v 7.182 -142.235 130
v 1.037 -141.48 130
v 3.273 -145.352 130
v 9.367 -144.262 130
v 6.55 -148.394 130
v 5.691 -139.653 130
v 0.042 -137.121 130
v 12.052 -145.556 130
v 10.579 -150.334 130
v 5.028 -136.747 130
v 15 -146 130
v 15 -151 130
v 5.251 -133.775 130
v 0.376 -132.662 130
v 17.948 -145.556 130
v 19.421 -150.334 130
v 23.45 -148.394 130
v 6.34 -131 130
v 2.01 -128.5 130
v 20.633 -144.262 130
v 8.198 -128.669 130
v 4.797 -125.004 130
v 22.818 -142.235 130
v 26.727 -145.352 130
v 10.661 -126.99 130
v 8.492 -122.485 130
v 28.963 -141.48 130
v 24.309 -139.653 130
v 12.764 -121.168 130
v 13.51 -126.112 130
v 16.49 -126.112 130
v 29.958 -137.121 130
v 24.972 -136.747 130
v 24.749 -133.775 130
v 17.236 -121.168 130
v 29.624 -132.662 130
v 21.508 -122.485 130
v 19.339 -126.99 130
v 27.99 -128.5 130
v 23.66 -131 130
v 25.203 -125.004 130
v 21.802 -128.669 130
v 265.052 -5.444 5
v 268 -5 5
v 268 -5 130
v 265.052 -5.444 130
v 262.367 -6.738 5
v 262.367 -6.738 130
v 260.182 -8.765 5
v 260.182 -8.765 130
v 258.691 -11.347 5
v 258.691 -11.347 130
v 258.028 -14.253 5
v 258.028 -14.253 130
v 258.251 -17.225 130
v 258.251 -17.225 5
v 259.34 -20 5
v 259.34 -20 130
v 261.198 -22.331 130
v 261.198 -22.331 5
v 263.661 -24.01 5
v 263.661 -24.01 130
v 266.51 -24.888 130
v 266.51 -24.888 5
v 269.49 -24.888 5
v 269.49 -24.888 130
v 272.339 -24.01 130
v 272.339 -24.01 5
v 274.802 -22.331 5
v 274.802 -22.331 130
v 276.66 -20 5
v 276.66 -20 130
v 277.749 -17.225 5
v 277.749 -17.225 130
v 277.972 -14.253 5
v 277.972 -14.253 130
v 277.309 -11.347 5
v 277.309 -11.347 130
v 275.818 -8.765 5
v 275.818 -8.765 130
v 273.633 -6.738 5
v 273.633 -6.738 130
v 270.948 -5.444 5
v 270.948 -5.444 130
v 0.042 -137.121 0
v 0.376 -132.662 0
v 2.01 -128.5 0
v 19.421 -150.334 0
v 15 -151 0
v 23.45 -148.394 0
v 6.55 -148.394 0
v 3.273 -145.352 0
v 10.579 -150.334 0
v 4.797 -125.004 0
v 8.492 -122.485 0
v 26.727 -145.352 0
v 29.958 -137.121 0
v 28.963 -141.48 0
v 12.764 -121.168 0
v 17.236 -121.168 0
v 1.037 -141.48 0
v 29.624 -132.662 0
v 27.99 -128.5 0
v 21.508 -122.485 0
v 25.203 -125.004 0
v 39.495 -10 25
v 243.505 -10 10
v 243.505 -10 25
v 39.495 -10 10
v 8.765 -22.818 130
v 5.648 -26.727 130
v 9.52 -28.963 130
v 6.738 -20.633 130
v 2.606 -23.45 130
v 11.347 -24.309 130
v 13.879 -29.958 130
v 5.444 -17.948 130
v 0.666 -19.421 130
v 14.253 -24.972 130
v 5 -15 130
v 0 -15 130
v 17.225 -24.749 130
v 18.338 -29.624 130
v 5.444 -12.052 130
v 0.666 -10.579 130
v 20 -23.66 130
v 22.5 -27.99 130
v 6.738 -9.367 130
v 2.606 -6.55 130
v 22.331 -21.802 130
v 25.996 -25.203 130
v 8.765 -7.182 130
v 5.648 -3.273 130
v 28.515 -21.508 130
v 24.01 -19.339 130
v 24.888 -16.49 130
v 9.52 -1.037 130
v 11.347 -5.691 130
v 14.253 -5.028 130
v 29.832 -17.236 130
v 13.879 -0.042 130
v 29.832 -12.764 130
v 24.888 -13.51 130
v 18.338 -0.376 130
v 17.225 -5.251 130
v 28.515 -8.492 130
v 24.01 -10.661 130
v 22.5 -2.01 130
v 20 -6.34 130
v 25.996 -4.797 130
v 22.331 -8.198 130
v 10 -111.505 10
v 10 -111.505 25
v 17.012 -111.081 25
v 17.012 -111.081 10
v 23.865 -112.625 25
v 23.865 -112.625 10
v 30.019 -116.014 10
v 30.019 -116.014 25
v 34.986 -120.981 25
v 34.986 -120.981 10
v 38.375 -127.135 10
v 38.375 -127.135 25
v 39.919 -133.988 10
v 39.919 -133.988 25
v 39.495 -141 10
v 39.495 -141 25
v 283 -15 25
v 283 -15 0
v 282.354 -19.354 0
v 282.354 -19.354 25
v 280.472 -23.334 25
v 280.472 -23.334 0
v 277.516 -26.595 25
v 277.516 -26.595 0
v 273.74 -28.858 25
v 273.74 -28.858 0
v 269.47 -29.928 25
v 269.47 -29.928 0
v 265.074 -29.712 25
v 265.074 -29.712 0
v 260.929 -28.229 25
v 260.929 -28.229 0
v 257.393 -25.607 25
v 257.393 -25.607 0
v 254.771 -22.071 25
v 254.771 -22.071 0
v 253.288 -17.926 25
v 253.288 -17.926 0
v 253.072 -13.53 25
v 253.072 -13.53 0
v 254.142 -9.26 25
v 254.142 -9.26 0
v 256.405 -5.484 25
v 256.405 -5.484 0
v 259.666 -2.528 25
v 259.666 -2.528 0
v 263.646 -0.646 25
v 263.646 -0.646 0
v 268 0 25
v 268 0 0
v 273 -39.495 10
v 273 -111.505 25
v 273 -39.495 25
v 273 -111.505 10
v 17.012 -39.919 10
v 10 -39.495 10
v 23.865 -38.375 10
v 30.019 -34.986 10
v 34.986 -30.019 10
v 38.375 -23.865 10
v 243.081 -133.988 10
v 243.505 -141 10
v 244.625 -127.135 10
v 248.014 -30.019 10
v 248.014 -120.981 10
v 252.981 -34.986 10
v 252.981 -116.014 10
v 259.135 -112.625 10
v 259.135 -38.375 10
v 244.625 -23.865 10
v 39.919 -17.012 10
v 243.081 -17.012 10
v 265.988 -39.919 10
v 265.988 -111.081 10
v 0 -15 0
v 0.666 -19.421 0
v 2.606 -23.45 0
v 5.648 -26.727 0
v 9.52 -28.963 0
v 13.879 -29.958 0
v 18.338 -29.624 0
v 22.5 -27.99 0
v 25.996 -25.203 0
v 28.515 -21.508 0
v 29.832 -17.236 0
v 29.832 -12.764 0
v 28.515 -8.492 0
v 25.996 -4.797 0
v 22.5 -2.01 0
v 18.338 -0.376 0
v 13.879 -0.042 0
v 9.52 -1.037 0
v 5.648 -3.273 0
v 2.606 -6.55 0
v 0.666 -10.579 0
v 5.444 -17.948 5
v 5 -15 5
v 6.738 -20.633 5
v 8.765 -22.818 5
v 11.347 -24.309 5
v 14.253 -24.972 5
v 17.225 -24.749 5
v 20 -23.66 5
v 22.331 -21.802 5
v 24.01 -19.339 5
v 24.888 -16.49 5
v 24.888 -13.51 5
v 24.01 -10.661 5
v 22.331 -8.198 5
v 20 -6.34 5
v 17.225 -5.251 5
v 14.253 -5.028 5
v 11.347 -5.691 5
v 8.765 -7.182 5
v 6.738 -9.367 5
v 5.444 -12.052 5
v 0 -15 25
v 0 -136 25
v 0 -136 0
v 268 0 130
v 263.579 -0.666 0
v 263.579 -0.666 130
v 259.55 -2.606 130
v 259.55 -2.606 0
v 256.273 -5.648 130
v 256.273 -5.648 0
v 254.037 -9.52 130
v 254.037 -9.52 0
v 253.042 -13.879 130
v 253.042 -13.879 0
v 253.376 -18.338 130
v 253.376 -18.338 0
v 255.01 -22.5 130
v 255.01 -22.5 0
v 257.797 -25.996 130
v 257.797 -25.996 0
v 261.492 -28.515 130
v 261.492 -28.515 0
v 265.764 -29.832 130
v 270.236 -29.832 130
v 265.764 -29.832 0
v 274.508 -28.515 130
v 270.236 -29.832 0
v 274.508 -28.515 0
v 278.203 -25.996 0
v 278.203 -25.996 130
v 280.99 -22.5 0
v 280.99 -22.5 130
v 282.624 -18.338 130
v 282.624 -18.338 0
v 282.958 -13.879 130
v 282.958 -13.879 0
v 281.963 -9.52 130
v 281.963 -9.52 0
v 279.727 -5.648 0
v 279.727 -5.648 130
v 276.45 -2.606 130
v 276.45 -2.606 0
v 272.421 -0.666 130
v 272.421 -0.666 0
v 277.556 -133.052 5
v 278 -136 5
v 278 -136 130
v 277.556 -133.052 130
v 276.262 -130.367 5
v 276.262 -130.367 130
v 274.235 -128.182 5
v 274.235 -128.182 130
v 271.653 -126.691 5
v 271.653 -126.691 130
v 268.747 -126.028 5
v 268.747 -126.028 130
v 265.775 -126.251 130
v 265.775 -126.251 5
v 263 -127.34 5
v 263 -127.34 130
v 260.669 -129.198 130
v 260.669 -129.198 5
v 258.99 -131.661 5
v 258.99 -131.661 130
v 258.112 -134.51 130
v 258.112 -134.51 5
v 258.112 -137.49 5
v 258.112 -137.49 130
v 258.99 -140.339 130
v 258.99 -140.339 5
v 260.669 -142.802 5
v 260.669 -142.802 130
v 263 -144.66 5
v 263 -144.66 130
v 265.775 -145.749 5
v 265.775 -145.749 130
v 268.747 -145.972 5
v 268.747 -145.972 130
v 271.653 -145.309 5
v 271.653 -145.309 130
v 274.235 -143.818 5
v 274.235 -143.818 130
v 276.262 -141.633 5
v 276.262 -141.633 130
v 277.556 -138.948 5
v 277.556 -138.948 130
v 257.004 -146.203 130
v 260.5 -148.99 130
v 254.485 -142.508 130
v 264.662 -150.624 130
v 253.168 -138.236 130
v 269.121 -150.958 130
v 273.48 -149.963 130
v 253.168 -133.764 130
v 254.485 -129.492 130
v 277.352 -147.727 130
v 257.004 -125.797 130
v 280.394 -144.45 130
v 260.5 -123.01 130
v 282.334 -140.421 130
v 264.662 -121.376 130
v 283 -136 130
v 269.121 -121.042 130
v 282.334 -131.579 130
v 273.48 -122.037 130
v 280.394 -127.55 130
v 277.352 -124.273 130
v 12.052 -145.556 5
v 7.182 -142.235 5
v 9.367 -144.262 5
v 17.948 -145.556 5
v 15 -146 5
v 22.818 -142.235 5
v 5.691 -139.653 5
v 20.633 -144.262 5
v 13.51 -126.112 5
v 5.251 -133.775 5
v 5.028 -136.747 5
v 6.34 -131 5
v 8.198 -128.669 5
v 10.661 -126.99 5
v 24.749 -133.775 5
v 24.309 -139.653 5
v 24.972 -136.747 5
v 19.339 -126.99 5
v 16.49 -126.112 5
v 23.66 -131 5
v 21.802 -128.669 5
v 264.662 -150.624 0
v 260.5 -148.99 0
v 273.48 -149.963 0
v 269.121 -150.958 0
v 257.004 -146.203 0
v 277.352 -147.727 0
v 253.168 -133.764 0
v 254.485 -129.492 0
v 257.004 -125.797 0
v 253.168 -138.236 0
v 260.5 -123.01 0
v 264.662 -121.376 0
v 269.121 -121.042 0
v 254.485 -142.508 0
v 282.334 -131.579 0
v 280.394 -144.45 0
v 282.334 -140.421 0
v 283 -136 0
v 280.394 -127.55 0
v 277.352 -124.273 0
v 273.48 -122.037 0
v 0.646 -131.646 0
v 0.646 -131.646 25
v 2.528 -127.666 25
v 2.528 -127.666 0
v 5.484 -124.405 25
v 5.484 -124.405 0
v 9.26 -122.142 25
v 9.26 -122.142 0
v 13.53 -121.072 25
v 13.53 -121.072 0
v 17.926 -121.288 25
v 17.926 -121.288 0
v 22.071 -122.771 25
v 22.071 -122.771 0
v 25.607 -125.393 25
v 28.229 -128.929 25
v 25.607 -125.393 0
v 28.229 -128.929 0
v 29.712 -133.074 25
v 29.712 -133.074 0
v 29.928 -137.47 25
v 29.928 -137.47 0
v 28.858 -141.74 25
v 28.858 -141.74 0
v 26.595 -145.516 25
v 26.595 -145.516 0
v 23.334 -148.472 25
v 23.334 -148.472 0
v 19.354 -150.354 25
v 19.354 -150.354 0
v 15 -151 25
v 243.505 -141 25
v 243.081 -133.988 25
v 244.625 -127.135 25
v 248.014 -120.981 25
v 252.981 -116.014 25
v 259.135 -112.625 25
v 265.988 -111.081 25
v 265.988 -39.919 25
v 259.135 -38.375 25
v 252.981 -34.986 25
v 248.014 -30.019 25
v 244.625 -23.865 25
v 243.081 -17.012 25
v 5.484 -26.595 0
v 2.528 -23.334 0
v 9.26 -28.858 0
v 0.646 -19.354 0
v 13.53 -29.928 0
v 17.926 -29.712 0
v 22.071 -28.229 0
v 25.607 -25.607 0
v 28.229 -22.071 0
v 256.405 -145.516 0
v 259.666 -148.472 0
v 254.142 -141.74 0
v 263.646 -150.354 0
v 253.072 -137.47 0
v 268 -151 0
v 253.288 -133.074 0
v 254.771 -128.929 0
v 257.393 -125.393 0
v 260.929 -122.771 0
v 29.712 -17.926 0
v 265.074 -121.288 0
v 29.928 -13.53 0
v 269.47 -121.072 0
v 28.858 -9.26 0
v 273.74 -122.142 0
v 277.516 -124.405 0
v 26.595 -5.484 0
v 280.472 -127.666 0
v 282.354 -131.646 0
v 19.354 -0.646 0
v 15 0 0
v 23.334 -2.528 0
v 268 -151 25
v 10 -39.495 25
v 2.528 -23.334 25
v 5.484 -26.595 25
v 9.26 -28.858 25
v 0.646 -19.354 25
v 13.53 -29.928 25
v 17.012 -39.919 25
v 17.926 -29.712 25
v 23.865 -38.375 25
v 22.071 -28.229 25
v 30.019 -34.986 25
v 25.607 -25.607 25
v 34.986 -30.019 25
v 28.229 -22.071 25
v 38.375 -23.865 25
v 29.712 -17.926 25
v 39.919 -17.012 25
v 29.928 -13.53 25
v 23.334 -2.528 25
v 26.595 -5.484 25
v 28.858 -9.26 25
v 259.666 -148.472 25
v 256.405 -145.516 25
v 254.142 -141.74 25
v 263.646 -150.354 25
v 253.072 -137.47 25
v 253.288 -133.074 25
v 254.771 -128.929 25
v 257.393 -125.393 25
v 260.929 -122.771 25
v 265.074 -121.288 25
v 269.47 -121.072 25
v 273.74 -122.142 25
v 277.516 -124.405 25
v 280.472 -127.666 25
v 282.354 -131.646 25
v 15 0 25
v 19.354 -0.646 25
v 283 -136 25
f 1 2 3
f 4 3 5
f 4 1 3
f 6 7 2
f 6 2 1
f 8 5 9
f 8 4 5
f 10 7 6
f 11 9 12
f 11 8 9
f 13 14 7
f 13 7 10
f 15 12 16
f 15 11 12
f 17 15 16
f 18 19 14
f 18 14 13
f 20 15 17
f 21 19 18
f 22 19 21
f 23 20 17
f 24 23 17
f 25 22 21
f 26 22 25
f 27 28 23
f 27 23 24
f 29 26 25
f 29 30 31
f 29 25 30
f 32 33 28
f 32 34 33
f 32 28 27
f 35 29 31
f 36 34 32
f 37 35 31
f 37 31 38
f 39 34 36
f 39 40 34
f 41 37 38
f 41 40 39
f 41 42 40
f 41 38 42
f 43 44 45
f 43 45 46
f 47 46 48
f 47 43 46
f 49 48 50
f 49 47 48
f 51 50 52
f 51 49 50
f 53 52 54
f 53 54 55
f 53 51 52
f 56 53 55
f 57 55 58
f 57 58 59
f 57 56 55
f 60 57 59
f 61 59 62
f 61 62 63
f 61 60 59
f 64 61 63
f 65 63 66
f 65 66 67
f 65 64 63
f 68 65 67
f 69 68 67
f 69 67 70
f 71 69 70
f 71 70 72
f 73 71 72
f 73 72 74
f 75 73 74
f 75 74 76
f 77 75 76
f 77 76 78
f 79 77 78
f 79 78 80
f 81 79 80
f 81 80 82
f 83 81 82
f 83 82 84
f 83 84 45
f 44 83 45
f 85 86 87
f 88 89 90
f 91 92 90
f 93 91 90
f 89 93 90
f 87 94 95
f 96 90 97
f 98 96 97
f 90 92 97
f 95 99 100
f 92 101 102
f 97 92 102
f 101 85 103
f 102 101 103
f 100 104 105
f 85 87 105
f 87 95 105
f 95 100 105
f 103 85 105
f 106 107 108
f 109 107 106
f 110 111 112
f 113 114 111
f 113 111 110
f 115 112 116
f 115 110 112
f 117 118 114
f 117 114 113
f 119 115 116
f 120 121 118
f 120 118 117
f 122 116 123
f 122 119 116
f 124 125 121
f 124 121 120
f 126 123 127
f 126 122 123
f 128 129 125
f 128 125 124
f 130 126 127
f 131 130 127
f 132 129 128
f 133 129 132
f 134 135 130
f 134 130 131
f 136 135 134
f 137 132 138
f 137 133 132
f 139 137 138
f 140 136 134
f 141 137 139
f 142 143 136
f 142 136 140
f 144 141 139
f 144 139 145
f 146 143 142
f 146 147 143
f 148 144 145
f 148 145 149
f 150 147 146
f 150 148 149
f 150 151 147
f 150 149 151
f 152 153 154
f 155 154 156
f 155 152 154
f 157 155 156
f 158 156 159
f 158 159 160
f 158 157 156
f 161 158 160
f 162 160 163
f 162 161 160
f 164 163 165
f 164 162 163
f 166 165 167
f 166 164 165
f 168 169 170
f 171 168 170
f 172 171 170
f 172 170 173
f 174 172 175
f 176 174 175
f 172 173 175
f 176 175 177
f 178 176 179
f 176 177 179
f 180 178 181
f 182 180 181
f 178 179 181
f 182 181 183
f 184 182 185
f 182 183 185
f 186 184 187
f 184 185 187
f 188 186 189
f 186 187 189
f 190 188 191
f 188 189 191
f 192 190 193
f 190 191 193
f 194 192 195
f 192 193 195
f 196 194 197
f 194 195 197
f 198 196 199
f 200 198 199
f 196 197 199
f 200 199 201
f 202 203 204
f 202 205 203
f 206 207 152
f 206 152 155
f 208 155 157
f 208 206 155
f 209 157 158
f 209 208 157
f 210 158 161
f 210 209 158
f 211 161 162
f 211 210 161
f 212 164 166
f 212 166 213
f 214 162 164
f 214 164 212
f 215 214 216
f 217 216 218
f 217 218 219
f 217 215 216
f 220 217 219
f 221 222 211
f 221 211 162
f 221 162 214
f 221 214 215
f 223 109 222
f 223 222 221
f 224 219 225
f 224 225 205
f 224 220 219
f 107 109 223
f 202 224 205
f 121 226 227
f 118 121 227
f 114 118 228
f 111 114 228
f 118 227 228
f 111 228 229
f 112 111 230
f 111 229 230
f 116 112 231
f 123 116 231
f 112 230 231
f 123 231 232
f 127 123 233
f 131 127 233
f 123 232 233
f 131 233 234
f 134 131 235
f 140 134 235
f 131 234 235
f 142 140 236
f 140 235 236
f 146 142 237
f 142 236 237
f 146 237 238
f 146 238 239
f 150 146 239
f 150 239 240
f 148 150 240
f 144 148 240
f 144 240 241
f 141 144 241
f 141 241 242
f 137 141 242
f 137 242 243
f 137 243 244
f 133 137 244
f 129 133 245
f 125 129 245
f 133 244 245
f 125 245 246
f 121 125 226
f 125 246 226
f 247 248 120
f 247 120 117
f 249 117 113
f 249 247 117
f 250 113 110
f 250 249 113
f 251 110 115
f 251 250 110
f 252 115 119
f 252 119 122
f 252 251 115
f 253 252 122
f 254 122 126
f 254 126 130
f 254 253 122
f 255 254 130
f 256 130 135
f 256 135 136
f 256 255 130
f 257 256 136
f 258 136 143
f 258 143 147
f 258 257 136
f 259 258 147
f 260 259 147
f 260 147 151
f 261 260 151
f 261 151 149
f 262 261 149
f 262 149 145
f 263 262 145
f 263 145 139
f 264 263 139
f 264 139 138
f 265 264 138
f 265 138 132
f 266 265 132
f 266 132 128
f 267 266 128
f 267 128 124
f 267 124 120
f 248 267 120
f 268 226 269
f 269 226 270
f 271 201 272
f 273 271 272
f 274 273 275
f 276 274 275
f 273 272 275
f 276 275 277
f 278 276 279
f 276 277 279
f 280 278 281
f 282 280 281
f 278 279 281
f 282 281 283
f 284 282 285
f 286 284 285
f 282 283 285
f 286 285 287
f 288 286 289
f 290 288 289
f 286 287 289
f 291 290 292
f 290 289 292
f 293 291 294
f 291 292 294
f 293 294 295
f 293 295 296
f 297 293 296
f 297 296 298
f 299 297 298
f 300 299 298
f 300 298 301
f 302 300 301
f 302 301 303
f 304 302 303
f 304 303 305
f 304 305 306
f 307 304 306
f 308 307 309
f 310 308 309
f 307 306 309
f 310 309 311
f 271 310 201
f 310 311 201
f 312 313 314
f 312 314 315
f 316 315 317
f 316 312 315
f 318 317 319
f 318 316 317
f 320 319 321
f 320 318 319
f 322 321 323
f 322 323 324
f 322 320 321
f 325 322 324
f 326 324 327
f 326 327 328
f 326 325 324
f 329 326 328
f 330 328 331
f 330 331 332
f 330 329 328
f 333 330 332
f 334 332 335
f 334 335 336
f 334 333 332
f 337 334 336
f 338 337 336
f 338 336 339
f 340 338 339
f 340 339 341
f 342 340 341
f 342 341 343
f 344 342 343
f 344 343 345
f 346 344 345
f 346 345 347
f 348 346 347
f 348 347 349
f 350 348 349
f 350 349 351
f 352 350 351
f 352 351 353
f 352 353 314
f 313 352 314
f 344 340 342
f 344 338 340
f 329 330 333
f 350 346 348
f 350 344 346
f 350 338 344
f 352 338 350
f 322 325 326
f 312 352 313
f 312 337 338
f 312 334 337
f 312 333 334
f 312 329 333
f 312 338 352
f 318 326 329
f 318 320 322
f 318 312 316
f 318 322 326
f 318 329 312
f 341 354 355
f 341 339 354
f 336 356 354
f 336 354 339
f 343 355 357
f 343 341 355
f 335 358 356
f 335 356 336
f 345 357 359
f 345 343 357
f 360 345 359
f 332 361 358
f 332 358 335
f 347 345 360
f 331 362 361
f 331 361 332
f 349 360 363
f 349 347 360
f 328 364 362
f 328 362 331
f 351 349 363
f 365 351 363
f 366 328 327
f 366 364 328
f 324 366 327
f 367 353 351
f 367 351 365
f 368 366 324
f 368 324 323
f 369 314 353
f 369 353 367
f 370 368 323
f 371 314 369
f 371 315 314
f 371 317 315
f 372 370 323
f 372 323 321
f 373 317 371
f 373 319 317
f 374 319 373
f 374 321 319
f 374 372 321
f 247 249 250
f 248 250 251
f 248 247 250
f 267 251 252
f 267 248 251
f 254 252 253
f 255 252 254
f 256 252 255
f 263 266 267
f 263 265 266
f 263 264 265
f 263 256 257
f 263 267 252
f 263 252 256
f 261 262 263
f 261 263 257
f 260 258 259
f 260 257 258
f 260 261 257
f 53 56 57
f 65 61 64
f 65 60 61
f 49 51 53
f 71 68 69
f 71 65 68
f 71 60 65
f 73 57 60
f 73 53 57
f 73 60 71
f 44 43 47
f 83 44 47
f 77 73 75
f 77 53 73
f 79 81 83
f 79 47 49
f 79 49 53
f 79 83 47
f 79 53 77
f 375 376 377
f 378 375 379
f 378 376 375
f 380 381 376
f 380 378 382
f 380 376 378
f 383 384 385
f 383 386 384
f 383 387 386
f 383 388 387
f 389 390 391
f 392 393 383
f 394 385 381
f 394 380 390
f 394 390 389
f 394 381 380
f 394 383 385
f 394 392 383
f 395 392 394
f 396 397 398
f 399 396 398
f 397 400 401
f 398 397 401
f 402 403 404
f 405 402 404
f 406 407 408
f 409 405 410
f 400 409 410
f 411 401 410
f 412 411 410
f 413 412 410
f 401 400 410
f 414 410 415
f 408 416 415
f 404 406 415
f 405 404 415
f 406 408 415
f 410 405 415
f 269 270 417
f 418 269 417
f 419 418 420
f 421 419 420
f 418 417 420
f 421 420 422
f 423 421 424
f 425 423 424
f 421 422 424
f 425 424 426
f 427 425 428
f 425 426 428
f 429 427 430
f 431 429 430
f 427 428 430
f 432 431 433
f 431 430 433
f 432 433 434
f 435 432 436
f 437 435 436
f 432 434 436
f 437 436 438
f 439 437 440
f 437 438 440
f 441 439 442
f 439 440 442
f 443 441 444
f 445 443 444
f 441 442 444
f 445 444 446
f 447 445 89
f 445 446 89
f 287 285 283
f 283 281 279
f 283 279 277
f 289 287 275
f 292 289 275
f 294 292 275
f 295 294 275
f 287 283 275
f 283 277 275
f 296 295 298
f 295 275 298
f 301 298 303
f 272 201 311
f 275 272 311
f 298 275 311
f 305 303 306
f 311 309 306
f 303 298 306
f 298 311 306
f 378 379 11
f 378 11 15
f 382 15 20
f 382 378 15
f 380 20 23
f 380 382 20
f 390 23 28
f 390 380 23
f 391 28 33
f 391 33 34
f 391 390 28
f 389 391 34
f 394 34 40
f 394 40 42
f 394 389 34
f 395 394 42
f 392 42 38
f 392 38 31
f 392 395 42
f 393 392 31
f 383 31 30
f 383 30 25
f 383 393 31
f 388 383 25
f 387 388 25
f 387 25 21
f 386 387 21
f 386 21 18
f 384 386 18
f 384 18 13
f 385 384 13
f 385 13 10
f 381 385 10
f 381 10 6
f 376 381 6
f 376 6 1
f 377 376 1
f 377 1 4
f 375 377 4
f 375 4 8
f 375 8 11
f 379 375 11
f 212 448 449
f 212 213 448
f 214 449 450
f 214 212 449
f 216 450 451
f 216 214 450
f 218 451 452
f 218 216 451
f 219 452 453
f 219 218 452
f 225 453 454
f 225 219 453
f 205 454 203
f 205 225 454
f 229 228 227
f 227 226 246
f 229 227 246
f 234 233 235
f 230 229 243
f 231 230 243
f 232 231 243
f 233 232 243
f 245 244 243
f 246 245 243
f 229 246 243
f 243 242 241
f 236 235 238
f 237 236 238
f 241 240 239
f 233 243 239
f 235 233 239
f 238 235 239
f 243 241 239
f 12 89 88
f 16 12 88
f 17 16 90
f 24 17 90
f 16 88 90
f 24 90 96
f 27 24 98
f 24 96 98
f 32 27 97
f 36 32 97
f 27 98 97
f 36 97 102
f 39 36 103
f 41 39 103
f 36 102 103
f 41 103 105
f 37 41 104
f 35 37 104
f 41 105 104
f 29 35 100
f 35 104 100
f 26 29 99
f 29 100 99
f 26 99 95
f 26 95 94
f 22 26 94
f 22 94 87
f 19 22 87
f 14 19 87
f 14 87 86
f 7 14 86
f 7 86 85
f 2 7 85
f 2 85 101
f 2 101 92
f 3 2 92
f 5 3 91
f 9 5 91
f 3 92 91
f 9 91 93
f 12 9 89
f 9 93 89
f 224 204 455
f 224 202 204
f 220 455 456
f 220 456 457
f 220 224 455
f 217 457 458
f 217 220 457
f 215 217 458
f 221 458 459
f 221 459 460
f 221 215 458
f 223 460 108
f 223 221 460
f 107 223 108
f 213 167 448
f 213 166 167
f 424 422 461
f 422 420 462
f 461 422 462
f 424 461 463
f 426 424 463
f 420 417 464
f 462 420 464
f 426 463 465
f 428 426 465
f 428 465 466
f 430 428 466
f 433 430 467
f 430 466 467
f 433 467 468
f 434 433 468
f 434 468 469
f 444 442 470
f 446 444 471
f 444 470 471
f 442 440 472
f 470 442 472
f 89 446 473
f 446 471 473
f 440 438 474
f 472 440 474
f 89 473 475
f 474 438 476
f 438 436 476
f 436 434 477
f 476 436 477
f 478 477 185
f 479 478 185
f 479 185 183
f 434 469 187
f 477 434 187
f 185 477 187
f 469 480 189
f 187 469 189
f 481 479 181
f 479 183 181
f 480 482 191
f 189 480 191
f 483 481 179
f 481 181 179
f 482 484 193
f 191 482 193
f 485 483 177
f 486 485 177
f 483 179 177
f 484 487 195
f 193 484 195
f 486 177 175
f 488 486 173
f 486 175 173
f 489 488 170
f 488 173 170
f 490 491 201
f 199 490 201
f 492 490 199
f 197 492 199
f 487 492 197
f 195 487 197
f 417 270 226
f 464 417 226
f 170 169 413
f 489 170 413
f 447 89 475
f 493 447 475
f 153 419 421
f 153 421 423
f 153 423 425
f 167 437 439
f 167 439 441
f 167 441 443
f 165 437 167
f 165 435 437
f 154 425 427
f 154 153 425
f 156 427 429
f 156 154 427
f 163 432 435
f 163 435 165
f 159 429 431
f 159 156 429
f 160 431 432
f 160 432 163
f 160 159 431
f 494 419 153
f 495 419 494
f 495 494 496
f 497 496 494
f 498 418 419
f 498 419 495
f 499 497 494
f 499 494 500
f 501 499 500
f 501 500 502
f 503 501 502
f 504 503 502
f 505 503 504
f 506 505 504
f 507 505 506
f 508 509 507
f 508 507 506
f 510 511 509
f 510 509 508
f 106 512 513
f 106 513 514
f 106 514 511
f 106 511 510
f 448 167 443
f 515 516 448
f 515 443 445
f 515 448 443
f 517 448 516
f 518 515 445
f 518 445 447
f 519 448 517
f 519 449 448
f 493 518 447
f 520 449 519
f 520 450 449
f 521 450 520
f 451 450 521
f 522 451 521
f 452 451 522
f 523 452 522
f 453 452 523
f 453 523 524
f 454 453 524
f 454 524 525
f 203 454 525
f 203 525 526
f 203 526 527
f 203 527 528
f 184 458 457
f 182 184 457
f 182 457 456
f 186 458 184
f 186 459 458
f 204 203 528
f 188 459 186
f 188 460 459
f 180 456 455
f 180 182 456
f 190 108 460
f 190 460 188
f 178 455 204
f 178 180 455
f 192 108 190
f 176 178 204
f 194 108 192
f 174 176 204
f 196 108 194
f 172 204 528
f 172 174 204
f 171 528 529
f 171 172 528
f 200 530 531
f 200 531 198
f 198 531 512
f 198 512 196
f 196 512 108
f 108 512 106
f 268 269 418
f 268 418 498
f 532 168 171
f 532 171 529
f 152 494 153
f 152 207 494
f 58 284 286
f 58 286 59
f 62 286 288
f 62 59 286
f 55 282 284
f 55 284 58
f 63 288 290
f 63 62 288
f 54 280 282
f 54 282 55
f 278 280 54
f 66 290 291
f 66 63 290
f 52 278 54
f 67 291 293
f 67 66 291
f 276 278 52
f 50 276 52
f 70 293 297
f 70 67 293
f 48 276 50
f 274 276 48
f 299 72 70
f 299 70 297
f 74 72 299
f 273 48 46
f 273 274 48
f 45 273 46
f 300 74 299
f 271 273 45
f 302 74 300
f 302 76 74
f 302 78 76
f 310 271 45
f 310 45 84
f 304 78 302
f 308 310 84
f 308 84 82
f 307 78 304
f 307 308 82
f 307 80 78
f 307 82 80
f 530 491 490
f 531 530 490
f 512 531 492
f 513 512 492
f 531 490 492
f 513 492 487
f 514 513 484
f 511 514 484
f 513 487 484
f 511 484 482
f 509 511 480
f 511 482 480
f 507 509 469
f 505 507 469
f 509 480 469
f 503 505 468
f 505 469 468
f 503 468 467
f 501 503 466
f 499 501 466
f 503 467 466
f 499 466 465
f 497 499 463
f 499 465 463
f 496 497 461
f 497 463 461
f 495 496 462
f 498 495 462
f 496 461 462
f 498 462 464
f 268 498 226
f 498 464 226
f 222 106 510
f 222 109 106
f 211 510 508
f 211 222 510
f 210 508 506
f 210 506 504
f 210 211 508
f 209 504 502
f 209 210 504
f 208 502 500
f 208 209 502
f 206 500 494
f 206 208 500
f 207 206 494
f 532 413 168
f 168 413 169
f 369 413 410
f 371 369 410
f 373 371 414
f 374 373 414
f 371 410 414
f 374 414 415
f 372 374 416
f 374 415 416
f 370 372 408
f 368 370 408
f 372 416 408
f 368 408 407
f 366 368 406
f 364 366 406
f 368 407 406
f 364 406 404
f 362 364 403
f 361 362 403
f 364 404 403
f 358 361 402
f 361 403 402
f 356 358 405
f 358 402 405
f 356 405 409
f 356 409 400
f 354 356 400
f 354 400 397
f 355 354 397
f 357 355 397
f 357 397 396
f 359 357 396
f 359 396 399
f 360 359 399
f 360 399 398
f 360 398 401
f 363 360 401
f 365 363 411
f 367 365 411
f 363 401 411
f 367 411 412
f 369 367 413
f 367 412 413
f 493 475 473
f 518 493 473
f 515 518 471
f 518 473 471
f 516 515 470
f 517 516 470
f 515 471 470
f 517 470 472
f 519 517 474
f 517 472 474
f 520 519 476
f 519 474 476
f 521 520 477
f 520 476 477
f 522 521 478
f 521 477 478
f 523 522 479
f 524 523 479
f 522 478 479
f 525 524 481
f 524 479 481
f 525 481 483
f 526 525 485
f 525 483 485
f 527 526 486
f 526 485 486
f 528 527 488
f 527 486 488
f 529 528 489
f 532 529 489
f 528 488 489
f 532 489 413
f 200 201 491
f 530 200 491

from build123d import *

# Parameters (mm, degrees)
F1_DEPTH = 25
F2_DEPTH = 130
F3_T     = -10
F4_T     = -5
F4_2_T   = -5
F4_3_T   = -5
F4_4_T   = -5


with BuildPart() as f1:
    # F0 (on Top) → F1 (new body)
    with BuildSketch(Plane.XY):
        with BuildLine():
            Line((268, 0), (15, 0))
            ThreePointArc((15, 0), (25.6066017178, -4.3933982822), (30, -15))
            ThreePointArc((30, -15), (15, -30), (0, -15))
            Line((0, -15), (0, -136))
            ThreePointArc((0, -136), (15, -121), (30, -136))
            ThreePointArc((30, -136), (25.6066017178, -146.6066017178), (15, -151))
            Line((15, -151), (268, -151))
            ThreePointArc((268, -151), (257.3933982822, -125.3933982822), (283, -136))
            Line((283, -136), (283, -15))
            ThreePointArc((283, -15), (257.3933982822, -25.6066017178), (268, 0))
        make_face()
    extrude(amount=F1_DEPTH)

    # F3
    f3_openings = [f1.faces().sort_by_distance(p)[0] for p in [
        (141.5, -75.5, 25),
    ]]
    offset(amount=F3_T, openings=f3_openings)


with BuildPart() as f2:
    # F0 (on Top) → F2 (new body)
    with BuildSketch(Plane.XY):
        with BuildLine():
            ThreePointArc((30, -15), (25.6066017178, -4.3933982822), (15, 0))
            ThreePointArc((15, 0), (4.3933982822, -4.3933982822), (0, -15))
            ThreePointArc((0, -15), (15, -30), (30, -15))
        make_face()
    extrude(amount=F2_DEPTH)

    # F4
    f4_openings = [f2.faces().sort_by_distance(p)[0] for p in [
        (15, -15, 130),
    ]]
    offset(amount=F4_T, openings=f4_openings)


with BuildPart() as f2b:
    # F0 (on Top) → F2, piece 2 (new body)
    with BuildSketch(Plane.XY):
        with BuildLine():
            ThreePointArc((30, -136), (15, -121), (0, -136))
            ThreePointArc((0, -136), (4.3933982822, -146.6066017178), (15, -151))
            ThreePointArc((15, -151), (25.6066017178, -146.6066017178), (30, -136))
        make_face()
    extrude(amount=F2_DEPTH)

    # F4#2
    f4_2_openings = [f2b.faces().sort_by_distance(p)[0] for p in [
        (15, -136, 130),
    ]]
    offset(amount=F4_2_T, openings=f4_2_openings)


with BuildPart() as f2c:
    # F0 (on Top) → F2, piece 3 (new body)
    with BuildSketch(Plane.XY):
        with BuildLine():
            ThreePointArc((268, -151), (278.6066017178, -146.6066017178), (283, -136))
            ThreePointArc((283, -136), (257.3933982822, -125.3933982822), (268, -151))
        make_face()
    extrude(amount=F2_DEPTH)

    # F4#3
    f4_3_openings = [f2c.faces().sort_by_distance(p)[0] for p in [
        (268, -136, 130),
    ]]
    offset(amount=F4_3_T, openings=f4_3_openings)


with BuildPart() as f2d:
    # F0 (on Top) → F2, piece 4 (new body)
    with BuildSketch(Plane.XY):
        with BuildLine():
            ThreePointArc((283, -15), (278.6066017178, -4.3933982822), (268, 0))
            ThreePointArc((268, 0), (257.3933982822, -25.6066017178), (283, -15))
        make_face()
    extrude(amount=F2_DEPTH)

    # F4#4
    f4_4_openings = [f2d.faces().sort_by_distance(p)[0] for p in [
        (268, -15, 130),
    ]]
    offset(amount=F4_4_T, openings=f4_4_openings)


solid = Compound([f1.part, f2.part, f2b.part, f2c.part, f2d.part])
